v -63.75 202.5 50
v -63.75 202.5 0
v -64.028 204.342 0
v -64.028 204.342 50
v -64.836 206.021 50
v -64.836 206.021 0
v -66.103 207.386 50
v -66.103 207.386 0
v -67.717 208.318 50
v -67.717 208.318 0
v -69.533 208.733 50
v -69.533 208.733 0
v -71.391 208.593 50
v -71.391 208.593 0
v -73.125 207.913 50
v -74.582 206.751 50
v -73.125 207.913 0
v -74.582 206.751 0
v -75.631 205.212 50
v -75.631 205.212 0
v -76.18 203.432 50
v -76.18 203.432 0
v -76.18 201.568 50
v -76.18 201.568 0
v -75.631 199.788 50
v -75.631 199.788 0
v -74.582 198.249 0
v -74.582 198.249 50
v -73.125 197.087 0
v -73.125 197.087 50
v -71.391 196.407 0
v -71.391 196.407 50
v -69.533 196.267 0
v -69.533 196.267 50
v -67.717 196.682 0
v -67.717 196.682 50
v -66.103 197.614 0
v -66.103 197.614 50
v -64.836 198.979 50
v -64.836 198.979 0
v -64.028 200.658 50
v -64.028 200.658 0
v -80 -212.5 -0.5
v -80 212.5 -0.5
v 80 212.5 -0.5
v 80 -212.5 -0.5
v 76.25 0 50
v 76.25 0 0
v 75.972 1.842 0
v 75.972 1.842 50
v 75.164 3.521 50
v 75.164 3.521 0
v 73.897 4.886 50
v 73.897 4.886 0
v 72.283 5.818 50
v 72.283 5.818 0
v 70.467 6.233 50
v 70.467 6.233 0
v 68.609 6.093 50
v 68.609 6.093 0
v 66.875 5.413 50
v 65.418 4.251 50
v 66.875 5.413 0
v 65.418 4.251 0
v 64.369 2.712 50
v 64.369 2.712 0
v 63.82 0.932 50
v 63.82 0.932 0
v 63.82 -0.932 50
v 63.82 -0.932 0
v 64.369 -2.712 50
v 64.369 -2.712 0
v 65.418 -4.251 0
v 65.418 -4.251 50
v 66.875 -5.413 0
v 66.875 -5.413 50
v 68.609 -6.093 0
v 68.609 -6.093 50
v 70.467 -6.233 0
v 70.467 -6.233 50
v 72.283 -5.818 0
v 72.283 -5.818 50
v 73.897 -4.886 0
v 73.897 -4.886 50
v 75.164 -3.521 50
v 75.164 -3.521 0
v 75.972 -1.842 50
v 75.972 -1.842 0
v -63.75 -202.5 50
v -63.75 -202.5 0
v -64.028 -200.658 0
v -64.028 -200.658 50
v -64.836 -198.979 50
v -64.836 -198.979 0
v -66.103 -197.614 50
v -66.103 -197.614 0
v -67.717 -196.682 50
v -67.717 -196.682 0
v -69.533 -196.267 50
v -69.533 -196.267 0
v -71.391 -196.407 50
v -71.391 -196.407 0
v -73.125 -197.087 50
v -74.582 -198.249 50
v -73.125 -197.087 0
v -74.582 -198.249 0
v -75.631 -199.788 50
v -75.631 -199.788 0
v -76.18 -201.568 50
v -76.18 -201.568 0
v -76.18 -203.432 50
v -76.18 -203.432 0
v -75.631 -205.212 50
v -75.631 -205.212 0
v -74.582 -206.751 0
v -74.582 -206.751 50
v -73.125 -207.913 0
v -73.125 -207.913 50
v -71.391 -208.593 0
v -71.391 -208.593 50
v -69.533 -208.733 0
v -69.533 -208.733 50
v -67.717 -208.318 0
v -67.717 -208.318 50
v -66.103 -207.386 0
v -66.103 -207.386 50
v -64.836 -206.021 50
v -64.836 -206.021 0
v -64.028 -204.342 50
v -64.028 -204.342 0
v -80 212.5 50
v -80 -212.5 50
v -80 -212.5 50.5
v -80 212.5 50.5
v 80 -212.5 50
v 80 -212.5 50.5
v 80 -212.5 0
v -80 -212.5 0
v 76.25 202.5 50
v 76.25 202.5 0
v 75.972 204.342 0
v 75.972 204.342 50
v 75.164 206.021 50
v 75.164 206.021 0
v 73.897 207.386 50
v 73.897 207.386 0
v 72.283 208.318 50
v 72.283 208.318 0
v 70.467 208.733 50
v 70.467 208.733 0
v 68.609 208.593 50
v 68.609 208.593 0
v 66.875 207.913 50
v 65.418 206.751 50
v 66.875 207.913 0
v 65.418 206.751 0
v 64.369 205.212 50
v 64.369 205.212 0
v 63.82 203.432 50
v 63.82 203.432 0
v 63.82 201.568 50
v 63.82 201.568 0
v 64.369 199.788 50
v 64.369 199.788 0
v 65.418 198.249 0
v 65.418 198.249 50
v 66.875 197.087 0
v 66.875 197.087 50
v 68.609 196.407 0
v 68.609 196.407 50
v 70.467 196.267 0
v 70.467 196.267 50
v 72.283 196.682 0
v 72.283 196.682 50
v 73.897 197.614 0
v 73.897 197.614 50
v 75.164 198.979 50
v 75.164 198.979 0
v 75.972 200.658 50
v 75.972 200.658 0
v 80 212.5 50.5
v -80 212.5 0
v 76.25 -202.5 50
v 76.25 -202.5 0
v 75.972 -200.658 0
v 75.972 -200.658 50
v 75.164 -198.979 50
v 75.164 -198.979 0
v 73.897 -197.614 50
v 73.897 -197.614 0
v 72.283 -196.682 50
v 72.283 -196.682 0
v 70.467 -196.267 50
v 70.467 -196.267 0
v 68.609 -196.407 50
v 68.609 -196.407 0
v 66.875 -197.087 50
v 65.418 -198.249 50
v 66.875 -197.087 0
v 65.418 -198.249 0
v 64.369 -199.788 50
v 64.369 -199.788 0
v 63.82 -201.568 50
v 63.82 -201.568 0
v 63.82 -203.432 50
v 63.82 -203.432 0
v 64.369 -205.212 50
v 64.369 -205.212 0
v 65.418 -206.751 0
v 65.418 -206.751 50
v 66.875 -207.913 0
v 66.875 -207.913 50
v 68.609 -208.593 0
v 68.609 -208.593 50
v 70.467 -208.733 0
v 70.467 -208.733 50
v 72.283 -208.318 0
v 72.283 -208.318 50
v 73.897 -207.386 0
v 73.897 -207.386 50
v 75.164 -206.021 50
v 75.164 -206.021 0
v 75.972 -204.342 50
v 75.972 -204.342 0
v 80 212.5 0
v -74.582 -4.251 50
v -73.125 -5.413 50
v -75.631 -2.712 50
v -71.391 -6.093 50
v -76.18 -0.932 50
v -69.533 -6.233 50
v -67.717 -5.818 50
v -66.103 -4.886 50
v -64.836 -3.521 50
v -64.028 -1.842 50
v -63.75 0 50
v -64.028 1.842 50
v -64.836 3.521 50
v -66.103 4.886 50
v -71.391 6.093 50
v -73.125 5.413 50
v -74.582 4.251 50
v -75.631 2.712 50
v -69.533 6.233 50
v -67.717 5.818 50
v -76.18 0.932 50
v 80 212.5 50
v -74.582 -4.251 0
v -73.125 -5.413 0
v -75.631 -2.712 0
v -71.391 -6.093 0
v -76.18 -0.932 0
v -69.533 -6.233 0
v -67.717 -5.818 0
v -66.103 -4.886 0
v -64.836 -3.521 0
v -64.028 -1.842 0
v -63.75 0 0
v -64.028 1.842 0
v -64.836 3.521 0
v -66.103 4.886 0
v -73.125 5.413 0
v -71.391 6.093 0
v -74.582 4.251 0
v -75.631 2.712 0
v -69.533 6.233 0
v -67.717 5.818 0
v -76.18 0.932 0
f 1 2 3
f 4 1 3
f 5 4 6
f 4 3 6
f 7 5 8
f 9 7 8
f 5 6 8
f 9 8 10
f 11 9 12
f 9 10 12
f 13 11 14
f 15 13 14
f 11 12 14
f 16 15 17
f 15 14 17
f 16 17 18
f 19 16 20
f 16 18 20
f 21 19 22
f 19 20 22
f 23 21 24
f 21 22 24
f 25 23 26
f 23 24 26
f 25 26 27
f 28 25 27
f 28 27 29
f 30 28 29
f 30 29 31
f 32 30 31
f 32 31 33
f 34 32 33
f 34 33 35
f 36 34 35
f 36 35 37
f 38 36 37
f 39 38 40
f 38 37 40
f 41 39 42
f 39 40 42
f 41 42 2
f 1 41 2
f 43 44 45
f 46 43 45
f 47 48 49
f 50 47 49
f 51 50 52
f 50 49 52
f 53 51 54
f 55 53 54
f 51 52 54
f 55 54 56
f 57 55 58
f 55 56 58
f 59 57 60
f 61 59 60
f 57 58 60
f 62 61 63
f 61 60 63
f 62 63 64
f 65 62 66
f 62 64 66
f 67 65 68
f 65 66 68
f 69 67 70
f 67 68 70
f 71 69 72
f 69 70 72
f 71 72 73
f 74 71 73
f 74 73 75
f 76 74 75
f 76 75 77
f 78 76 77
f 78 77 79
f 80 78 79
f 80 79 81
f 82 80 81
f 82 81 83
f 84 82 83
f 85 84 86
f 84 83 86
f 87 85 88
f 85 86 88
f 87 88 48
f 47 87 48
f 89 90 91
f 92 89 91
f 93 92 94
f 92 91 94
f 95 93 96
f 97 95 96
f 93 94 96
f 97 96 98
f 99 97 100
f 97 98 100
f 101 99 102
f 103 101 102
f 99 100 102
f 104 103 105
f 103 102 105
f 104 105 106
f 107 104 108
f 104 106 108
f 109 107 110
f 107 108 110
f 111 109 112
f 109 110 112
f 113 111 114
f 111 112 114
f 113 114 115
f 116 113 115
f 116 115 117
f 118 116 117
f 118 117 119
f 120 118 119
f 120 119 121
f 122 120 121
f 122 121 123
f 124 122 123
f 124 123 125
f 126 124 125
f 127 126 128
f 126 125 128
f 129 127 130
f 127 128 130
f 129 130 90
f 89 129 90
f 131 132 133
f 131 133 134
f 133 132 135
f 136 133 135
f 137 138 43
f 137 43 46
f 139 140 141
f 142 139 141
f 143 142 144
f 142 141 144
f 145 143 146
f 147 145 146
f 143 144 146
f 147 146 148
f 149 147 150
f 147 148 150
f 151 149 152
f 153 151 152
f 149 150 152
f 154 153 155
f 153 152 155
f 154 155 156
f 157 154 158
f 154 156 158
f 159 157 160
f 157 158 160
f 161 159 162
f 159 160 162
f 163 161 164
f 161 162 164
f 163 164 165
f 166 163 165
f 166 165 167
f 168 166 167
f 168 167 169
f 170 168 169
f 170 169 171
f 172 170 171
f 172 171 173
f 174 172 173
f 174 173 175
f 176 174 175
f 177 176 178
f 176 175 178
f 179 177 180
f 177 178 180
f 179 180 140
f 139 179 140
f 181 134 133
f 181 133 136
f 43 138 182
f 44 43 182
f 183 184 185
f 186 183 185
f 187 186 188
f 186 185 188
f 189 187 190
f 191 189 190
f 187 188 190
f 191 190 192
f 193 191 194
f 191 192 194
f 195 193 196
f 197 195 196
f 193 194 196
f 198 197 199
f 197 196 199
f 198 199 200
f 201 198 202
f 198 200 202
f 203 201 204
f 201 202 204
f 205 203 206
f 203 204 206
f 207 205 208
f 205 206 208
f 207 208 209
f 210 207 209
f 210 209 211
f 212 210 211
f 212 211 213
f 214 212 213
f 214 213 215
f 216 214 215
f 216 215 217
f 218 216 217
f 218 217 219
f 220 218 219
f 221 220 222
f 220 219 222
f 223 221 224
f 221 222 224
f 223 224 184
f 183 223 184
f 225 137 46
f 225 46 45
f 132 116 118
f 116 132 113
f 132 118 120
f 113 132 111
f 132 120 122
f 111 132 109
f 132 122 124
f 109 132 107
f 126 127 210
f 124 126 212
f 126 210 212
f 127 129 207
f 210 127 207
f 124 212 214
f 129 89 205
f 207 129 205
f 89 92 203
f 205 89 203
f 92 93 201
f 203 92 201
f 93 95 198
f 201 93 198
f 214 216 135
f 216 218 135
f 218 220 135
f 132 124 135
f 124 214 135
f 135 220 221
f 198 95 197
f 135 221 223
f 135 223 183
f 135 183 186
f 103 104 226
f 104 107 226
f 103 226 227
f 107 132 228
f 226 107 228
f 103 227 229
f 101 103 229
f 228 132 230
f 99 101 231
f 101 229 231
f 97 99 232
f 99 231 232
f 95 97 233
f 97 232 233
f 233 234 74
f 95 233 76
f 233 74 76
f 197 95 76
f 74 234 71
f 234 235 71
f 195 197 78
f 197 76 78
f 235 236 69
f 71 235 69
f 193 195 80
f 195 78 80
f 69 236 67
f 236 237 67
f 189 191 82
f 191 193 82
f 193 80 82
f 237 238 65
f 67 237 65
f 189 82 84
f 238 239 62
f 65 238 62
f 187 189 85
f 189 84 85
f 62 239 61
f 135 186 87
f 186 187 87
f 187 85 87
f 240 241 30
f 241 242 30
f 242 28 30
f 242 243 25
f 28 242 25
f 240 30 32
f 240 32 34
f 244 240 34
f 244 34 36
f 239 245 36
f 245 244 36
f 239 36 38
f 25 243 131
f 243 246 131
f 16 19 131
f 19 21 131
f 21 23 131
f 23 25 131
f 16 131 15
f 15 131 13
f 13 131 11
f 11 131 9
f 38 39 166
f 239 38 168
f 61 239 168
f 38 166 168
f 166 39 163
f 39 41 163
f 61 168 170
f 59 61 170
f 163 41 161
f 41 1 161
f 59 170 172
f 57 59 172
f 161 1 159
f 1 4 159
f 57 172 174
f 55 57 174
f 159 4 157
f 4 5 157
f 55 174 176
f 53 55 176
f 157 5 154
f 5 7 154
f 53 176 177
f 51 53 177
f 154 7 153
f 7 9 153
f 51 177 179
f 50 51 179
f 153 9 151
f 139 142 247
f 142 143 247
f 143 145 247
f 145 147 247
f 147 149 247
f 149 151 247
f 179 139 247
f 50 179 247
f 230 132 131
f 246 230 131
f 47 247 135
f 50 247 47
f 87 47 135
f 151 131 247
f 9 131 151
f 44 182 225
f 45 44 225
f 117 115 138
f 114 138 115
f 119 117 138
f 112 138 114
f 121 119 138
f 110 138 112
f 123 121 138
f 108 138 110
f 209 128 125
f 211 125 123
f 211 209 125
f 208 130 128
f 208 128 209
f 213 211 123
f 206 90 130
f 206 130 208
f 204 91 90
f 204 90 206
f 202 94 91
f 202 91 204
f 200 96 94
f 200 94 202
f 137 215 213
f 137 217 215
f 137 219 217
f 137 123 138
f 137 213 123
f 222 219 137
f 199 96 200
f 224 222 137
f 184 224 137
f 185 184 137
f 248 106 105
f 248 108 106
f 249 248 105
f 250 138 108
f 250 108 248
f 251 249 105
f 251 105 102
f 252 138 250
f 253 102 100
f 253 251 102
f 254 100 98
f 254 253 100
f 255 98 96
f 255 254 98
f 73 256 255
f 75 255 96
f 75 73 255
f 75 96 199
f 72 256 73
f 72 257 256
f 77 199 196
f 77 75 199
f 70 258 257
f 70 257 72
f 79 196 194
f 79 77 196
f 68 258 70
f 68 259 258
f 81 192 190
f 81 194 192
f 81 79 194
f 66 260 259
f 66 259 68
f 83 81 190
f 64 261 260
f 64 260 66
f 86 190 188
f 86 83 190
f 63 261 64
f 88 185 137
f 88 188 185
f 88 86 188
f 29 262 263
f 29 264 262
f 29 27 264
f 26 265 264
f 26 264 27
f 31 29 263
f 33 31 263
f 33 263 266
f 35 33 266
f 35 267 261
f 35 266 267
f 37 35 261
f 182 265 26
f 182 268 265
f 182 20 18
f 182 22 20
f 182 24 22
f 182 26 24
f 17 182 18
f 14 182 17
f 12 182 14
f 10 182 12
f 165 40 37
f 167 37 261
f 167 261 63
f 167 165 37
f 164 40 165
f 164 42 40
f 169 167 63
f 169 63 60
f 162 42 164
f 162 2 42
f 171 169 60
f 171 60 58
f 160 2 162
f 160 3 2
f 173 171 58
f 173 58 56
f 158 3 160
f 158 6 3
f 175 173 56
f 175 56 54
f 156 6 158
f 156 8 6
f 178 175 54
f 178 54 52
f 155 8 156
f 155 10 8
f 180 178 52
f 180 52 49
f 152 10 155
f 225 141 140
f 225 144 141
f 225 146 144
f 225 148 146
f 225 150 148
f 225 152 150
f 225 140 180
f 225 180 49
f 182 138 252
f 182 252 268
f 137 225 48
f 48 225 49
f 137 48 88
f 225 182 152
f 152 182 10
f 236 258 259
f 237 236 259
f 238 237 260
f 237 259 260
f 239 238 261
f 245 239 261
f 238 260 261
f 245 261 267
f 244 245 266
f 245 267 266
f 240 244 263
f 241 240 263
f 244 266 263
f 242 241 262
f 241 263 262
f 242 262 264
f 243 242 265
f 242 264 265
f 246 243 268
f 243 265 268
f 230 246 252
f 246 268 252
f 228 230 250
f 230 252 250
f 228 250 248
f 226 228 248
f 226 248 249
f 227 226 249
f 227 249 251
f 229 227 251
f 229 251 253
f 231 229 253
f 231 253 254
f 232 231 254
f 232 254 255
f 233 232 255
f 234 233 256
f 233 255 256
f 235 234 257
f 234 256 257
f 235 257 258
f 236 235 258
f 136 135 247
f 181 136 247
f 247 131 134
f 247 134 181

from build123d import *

# Parameters (mm, degrees)
F0_W     = 160
F0_H     = 425
F1_DEPTH = 0.5
F2_R     = 6.25
F3_DEPTH = 50
F4_W     = 160
F4_H     = 425
F5_DEPTH = 0.5


with BuildPart() as f1:
    # F0 (on Top) → F1 (new body)
    with BuildSketch(Plane.XY):
        Rectangle(F0_W, F0_H)
    extrude(amount=-F1_DEPTH)

    # F2 (on face) → F3 (join)
    with BuildSketch(Plane.XY):
        with Locations((-70, 202.5)):
            Circle(F2_R)
        with Locations((-70, 0)):
            Circle(F2_R)
        with Locations((-70, -202.5)):
            Circle(F2_R)
        with Locations((70, 202.5)):
            Circle(F2_R)
        with Locations((70, 0)):
            Circle(F2_R)
        with Locations((70, -202.5)):
            Circle(F2_R)
    extrude(amount=F3_DEPTH)

    # F4 (on face) → F5 (join)
    with BuildSketch(Plane.XY.offset(50)):
        Rectangle(F4_W, F4_H)
    extrude(amount=F5_DEPTH)


solid = f1.part
